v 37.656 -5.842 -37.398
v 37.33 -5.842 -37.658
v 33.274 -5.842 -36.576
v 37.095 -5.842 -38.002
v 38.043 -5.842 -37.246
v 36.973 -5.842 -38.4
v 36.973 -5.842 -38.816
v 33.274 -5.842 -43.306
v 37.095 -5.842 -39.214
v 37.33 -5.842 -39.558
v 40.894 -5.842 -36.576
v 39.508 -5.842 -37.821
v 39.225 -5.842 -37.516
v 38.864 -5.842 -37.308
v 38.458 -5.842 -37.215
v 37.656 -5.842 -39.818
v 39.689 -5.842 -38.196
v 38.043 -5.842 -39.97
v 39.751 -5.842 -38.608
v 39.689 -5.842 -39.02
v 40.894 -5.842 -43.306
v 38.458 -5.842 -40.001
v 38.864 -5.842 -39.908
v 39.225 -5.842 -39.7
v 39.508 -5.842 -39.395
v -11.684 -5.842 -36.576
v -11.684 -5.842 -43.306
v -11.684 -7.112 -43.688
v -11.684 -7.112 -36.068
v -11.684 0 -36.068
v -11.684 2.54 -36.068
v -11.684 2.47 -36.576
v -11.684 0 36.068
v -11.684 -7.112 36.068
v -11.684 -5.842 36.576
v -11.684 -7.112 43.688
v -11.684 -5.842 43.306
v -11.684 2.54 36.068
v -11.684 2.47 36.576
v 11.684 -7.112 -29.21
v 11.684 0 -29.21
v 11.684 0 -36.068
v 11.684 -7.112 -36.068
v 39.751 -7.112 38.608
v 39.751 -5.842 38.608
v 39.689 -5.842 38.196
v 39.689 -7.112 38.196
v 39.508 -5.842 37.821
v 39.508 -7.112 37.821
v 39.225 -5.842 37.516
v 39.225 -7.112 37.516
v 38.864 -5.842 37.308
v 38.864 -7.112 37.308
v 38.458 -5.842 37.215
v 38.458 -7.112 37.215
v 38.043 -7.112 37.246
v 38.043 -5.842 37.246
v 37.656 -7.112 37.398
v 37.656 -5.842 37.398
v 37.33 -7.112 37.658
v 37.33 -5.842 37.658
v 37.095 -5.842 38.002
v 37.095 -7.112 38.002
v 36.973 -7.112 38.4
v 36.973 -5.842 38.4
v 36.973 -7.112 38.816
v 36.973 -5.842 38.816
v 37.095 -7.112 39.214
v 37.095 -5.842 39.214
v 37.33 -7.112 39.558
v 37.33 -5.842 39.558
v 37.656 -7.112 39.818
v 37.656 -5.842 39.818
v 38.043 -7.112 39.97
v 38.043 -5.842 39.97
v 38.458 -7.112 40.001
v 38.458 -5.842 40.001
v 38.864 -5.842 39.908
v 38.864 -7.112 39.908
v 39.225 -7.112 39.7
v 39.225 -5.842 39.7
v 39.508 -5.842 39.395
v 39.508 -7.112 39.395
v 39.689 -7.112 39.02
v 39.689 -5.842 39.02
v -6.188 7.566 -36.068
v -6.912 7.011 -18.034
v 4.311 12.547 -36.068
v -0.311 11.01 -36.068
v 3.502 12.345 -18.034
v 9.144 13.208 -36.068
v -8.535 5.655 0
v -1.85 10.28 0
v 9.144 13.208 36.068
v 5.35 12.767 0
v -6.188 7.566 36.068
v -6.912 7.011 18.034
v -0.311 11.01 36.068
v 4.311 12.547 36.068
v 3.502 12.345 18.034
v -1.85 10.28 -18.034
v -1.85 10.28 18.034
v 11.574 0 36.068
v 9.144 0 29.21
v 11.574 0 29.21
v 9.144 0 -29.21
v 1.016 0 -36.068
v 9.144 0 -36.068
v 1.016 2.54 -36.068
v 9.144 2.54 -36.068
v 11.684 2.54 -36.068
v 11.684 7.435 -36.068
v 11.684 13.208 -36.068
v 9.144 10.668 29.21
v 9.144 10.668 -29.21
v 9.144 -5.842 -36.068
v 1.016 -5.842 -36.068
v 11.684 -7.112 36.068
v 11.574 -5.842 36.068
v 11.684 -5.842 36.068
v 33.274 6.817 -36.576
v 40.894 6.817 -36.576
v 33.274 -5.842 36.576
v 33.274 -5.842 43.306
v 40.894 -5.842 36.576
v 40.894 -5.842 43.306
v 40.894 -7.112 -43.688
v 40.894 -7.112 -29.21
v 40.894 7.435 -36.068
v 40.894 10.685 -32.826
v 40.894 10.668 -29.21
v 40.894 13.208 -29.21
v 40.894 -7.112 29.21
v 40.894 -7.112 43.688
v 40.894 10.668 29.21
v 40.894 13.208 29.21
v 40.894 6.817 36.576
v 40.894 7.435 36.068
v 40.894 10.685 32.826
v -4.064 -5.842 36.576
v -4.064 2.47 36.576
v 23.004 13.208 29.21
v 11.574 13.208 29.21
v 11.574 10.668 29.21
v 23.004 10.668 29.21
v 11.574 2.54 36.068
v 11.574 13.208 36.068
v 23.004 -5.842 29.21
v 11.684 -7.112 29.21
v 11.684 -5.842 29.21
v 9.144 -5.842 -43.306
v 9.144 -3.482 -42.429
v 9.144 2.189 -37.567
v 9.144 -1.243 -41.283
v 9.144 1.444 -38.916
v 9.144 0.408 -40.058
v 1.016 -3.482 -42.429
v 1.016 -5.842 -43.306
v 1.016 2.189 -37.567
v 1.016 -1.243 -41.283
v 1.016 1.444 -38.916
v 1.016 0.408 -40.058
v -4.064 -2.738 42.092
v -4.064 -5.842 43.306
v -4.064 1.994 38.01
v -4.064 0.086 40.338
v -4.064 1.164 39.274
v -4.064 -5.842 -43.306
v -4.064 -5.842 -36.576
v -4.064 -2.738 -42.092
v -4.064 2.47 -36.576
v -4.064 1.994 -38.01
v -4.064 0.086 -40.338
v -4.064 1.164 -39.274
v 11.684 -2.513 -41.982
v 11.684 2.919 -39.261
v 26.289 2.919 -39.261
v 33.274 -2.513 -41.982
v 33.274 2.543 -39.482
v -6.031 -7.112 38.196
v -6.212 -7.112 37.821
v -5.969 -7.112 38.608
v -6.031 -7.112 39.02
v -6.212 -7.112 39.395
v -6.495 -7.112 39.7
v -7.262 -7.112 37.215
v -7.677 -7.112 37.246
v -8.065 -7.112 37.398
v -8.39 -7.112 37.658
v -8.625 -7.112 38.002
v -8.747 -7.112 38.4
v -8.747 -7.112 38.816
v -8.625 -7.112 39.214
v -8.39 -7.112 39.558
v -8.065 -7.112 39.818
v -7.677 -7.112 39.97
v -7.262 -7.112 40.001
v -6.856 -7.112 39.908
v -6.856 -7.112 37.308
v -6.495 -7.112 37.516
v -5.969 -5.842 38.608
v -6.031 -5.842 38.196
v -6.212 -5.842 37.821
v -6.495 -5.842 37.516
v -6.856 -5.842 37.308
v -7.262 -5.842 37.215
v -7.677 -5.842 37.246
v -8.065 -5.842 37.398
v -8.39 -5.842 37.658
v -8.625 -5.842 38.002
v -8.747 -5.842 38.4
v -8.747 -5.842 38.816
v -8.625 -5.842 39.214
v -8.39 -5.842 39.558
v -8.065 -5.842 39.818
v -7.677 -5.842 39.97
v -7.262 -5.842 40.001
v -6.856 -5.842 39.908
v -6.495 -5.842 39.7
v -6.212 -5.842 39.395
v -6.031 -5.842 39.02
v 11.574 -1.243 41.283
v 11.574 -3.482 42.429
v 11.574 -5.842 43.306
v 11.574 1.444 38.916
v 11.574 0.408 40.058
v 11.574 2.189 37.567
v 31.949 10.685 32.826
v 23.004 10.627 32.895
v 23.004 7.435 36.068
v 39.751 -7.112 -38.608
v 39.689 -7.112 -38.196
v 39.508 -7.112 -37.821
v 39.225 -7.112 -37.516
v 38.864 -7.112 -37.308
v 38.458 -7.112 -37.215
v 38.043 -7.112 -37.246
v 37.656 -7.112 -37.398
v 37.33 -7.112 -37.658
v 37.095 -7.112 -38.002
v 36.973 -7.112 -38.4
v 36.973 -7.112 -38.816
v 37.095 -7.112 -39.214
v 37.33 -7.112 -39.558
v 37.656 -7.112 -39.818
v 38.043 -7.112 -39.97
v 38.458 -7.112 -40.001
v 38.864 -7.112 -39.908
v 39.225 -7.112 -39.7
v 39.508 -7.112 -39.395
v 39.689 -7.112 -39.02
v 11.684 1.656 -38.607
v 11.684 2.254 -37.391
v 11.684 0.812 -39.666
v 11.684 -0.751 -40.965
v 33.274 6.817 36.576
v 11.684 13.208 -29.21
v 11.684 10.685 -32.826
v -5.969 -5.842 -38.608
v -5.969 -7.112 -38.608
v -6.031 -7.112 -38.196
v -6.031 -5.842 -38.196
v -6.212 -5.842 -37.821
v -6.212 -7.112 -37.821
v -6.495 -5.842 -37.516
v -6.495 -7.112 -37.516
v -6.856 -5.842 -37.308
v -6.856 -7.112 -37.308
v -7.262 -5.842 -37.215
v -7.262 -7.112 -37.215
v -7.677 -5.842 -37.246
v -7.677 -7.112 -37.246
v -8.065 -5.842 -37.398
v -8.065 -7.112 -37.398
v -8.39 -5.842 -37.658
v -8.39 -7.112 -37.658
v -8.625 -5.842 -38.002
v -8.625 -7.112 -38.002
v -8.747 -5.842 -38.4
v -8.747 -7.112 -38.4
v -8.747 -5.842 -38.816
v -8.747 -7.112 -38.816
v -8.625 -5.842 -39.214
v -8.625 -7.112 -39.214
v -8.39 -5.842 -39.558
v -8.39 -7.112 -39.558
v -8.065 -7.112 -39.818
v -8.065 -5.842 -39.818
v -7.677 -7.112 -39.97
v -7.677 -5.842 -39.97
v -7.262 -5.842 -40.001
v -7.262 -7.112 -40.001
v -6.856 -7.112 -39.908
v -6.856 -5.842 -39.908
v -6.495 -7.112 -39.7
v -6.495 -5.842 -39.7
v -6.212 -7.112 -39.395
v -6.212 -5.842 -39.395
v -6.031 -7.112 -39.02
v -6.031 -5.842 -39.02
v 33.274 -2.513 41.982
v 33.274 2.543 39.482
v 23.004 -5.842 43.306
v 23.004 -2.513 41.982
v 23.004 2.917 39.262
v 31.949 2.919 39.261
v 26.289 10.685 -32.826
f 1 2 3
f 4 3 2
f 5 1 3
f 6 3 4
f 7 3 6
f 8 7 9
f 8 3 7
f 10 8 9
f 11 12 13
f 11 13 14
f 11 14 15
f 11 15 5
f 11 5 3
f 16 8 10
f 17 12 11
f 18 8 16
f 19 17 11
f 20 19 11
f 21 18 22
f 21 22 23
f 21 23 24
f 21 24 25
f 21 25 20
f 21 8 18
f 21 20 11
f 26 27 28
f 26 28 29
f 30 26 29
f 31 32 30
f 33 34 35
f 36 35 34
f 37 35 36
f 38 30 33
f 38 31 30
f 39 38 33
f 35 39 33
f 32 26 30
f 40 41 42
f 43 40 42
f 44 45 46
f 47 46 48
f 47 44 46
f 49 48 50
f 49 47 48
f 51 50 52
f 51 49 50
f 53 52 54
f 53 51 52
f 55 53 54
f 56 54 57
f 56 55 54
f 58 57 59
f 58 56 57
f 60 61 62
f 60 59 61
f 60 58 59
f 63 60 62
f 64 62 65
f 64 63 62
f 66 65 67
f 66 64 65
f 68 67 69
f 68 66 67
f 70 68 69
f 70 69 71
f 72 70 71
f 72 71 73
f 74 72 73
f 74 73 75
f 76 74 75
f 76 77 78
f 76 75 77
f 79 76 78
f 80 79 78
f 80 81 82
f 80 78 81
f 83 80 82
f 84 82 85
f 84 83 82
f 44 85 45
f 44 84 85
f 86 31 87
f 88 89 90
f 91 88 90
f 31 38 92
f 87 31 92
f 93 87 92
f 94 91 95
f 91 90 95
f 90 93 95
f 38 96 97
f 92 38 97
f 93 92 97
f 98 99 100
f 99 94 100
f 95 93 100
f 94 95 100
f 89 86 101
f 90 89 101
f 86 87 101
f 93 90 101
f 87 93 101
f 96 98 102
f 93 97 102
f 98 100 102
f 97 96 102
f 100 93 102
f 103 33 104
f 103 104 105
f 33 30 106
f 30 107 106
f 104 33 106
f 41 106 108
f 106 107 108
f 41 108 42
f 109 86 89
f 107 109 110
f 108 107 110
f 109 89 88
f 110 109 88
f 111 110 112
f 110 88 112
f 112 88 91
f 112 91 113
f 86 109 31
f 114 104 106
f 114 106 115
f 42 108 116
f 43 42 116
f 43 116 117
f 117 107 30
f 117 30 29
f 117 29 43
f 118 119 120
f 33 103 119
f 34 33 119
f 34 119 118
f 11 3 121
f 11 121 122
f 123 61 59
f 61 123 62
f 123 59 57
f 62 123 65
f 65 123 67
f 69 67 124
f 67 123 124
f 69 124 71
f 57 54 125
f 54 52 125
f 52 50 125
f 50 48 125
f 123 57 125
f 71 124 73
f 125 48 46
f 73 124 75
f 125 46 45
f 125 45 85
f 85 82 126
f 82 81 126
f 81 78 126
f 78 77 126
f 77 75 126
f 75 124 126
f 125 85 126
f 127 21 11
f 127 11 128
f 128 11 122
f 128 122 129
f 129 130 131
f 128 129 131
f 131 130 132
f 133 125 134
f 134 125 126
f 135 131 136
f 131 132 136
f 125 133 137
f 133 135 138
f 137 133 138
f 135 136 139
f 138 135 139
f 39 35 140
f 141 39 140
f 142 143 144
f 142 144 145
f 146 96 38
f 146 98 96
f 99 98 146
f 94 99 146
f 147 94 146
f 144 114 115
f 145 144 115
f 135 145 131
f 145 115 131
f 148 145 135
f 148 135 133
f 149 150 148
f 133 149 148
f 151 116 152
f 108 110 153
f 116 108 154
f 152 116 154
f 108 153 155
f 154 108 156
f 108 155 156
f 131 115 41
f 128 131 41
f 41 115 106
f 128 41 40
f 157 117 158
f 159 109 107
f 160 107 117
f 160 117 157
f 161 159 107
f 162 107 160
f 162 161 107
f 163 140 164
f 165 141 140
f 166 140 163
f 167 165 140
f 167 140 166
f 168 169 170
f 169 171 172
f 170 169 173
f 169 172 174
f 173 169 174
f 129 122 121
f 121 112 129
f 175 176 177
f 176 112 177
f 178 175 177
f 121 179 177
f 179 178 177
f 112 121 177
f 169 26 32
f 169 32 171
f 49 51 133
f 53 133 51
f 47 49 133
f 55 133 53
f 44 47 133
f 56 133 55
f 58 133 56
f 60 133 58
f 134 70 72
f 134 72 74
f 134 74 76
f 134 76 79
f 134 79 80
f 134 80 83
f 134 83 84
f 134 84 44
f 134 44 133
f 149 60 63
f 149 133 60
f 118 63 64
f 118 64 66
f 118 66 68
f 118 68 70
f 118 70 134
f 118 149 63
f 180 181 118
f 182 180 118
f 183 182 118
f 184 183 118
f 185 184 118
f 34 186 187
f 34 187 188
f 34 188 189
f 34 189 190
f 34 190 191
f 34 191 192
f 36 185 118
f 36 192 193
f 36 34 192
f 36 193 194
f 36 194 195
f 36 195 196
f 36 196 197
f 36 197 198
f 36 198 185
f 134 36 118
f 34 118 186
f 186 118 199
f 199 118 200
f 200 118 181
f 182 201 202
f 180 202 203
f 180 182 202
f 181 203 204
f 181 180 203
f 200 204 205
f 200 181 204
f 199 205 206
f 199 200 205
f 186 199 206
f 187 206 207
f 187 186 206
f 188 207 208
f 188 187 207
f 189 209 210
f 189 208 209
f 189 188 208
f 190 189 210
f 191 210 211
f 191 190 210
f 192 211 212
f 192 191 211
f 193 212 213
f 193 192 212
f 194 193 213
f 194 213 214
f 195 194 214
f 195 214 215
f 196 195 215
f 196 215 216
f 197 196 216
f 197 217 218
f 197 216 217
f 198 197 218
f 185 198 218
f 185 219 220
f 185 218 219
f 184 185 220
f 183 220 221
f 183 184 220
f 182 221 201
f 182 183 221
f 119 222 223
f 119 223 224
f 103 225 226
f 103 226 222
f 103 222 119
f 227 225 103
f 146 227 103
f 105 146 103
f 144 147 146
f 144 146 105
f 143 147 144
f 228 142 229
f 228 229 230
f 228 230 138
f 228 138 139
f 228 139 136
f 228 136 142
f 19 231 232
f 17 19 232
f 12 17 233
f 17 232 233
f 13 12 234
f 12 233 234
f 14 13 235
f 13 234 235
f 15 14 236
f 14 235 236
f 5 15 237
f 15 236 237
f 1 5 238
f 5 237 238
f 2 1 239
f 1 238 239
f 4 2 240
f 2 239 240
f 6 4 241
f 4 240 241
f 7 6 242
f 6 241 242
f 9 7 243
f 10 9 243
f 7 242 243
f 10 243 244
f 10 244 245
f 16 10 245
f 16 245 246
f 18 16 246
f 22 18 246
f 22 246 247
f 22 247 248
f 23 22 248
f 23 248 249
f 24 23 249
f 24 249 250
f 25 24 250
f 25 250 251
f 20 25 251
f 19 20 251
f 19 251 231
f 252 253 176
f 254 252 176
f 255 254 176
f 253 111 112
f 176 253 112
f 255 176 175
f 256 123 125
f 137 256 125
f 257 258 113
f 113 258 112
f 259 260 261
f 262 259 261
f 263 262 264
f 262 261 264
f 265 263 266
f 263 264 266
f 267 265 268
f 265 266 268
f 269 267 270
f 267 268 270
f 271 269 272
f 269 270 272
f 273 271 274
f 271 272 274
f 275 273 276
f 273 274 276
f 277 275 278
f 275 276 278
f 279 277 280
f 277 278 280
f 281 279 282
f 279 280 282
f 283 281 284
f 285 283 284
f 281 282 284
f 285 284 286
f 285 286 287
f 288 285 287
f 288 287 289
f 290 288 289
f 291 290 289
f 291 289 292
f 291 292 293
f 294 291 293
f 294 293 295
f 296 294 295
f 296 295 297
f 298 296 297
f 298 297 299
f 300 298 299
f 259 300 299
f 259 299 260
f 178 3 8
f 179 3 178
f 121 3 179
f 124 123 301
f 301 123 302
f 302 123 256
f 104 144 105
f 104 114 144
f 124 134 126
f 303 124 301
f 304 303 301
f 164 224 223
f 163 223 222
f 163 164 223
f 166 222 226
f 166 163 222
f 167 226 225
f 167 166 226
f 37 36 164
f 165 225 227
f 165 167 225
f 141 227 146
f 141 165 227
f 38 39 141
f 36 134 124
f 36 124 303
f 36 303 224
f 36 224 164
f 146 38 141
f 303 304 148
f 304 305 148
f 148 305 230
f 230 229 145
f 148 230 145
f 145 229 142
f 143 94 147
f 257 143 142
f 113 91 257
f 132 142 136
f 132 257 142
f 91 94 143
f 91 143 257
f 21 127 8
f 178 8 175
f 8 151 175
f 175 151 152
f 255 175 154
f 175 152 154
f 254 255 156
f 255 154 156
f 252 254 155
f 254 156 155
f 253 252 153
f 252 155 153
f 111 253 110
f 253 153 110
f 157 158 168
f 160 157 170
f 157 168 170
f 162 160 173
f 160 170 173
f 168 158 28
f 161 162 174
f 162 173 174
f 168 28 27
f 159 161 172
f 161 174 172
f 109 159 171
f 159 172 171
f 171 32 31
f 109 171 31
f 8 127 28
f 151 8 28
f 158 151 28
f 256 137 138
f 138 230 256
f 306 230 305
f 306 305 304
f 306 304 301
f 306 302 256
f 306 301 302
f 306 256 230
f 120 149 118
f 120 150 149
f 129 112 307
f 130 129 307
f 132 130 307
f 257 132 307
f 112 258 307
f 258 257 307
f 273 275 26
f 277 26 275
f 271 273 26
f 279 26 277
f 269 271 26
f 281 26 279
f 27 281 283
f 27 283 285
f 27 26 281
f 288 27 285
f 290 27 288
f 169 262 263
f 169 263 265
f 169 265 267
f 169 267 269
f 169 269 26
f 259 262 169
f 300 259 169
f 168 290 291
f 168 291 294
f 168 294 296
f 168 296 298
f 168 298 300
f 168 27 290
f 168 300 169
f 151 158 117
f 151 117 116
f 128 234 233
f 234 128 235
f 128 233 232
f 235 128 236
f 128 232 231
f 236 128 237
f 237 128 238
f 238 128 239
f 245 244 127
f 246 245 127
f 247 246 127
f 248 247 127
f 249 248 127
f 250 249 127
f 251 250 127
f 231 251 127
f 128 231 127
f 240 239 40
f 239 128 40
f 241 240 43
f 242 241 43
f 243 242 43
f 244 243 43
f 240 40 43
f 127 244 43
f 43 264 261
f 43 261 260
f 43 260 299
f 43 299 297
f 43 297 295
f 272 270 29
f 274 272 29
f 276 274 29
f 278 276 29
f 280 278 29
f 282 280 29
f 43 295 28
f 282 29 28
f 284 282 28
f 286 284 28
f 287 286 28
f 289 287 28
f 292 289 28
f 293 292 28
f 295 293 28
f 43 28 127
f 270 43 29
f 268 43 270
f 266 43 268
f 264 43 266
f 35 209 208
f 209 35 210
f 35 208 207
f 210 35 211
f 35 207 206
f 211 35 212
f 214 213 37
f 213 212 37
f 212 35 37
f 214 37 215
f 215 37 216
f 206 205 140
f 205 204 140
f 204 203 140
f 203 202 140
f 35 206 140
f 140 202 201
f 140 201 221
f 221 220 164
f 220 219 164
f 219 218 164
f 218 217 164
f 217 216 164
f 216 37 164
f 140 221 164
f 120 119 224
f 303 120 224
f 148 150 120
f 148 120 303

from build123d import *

# Parameters (mm, degrees)
SKETCH1_W           = 23.368
SKETCH1_H           = 72.136
BOSS_EXTRUDE1_DEPTH = 2.54
SKETCH2_W           = 2.54
SKETCH2_H           = 58.42
CUT_EXTRUDE1_DEPTH  = 2.54
SKETCH3_W           = 2.54
SKETCH3_H           = 6.858
BOSS_EXTRUDE2_DEPTH = 8.128
SKETCH4_W           = 31.75
SKETCH4_H           = 58.42
BOSS_EXTRUDE3_DEPTH = 2.54
SKETCH5_W           = 2.54
SKETCH5_H           = 6.858
BOSS_EXTRUDE4_DEPTH = 2.54
BOSS_EXTRUDE5_START = -11.684
BOSS_EXTRUDE5_DEPTH = 52.578
BOSS_EXTRUDE6_DEPTH = 29.21
SKETCH10_W          = 7.62
SKETCH10_H          = 7.112
CUT_EXTRUDE2_DEPTH  = 31.242
SKETCH12_R          = 1.397
CUT_EXTRUDE3_DEPTH  = 21.3200001
BOSS_EXTRUDE7_DEPTH = 72.136
SKETCH14_W          = 8.128
SKETCH14_H          = 7.62
SKETCH14_W_2        = 11.43
SKETCH14_H_2        = 14.478
CUT_EXTRUDE4_DEPTH  = 31.242


with BuildPart() as part:
    # Sketch1 → Boss-Extrude1 (new body)
    with BuildSketch(Plane(origin=(0, 0, 0), x_dir=(1, 0, 0), z_dir=(0, 1, 0))):
        Rectangle(SKETCH1_W, SKETCH1_H)
    extrude(amount=BOSS_EXTRUDE1_DEPTH)

    # Sketch2 → Cut-Extrude1 (cut)
    with BuildSketch(Plane(origin=(0, 2.54, 0), x_dir=(1, 0, 0), z_dir=(0, 1, 0))):
        with Locations((10.414, 0)):
            Rectangle(SKETCH2_W, SKETCH2_H)
    extrude(amount=-CUT_EXTRUDE1_DEPTH, mode=Mode.SUBTRACT)

    # Sketch3 → Boss-Extrude2 (add)
    with BuildSketch(Plane(origin=(0, 2.54, 0), x_dir=(1, 0, 0), z_dir=(0, 1, 0))):
        with Locations((10.414, -32.639)):
            Rectangle(SKETCH3_W, SKETCH3_H)
        with Locations((10.414, 32.639)):
            Rectangle(SKETCH3_W, SKETCH3_H)
    extrude(amount=BOSS_EXTRUDE2_DEPTH)



with BuildPart() as body_2:
    # Sketch4 → Boss-Extrude3 (new body)
    with BuildSketch(Plane(origin=(0, 10.668, 0), x_dir=(1, 0, 0), z_dir=(0, 1, 0))):
        with Locations((25.019, 0)):
            Rectangle(SKETCH4_W, SKETCH4_H)
    extrude(amount=BOSS_EXTRUDE3_DEPTH)


with BuildPart() as part_1:
    add(part.part)

    add(body_2.part)  # Boss-Extrude4 merges body 2
    # Sketch5 → Boss-Extrude4 (add)
    with BuildSketch(Plane(origin=(0, 10.668, 0), x_dir=(1, 0, 0), z_dir=(0, 1, 0))):
        with Locations((10.414, -32.639)):
            Rectangle(SKETCH5_W, SKETCH5_H)
        with Locations((10.414, 32.639)):
            Rectangle(SKETCH5_W, SKETCH5_H)
    extrude(amount=BOSS_EXTRUDE4_DEPTH)

    # Sketch6 → Boss-Extrude5 (add)
    with BuildSketch(Plane(origin=(0, 0, 0), x_dir=(0, 0, -1), z_dir=(1, 0, 0)).offset(BOSS_EXTRUDE5_START)):
        with BuildLine():
            add(Edge.make_bspline(
                [(43.688, -7.112), (41.104515695, 2.079413445), (36.068, 2.54)],
                knots=[0, 0, 0, 0.627076912, 0.627076912, 0.627076912], degree=2))
            Line((36.068, 2.54), (36.068, -7.112))
            Line((36.068, -7.112), (43.688, -7.112))
        make_face()
    boss_extrude5 = extrude(amount=BOSS_EXTRUDE5_DEPTH)

    # Sketch7 → Boss-Extrude6 (add)
    with BuildSketch(Plane(origin=(11.684, 0, 0), x_dir=(0, 0, -1), z_dir=(1, 0, 0))):
        with BuildLine():
            add(Edge.make_bspline(
                [(36.068, 7.434839088), (33.013673055, 11.048422605), (29.21, 13.208)],
                knots=[0.279115305, 0.279115305, 0.279115305, 0.460674554, 0.460674554, 0.460674554], degree=2))
            Line((29.21, 13.208), (29.21, 10.668))
            Line((29.21, 10.668), (29.21, 0))
            Line((29.21, 0), (36.068, 0))
            Line((36.068, 0), (36.068, 2.54))
            Line((36.068, 2.54), (36.068, 7.434839088))
        make_face()
        with BuildLine():
            add(Edge.make_bspline(
                [(43.688, -7.112), (40.763488669, 1.879592133), (36.068, 7.434839088)],
                knots=[0, 0, 0, 0.279115305, 0.279115305, 0.279115305], degree=2))
            Line((36.068, 7.434839088), (36.068, 2.54))
            Line((36.068, 2.54), (36.068, 0))
            Line((36.068, 0), (29.21, 0))
            Line((29.21, 0), (29.21, -7.112))
            Line((29.21, -7.112), (43.688, -7.112))
        make_face()
    boss_extrude6 = extrude(amount=BOSS_EXTRUDE6_DEPTH)

    # Sketch10 → Cut-Extrude2 (cut)
    with BuildSketch(Plane(origin=(0, 25.4, 0), x_dir=(1, 0, 0), z_dir=(0, 1, 0))):
        with Locations((-7.874, 40.132)):
            Rectangle(SKETCH10_W, SKETCH10_H)
        with Locations((37.084, 40.132)):
            Rectangle(SKETCH10_W, SKETCH10_H)
    cut_extrude2 = extrude(amount=-CUT_EXTRUDE2_DEPTH, mode=Mode.SUBTRACT)

    # Sketch12 → Cut-Extrude3 (cut, through all)
    with BuildSketch(Plane.XZ.offset(7.112)):
        with Locations((-7.366, -38.608)):
            Circle(SKETCH12_R)
        with Locations((38.354, -38.608)):
            Circle(SKETCH12_R)
    cut_extrude3 = extrude(amount=-CUT_EXTRUDE3_DEPTH, mode=Mode.SUBTRACT)

    # Mirror1: Boss-Extrude5, Boss-Extrude6, Cut-Extrude2, Cut-Extrude3 across plane
    add(boss_extrude5.mirror(Plane.XY))
    add(boss_extrude6.mirror(Plane.XY))
    add(cut_extrude2.mirror(Plane.XY), mode=Mode.SUBTRACT)
    add(cut_extrude3.mirror(Plane.XY), mode=Mode.SUBTRACT)

    # Sketch13 → Boss-Extrude7 (add)
    with BuildSketch(Plane.XY.offset(36.068)):
        with BuildLine():
            Line((9.144, 2.54), (9.144, 13.208))
            add(Edge.make_bspline(
                [(-11.684, 2.54), (-2.430581771, 12.68572622), (9.144, 13.208)],
                knots=[0, 0, 0, 0.902085906, 0.902085906, 0.902085906], degree=2))
            Line((-11.684, 2.54), (9.144, 2.54))
        make_face()
    extrude(amount=-BOSS_EXTRUDE7_DEPTH)

    # Sketch14 → Cut-Extrude4 (cut)
    with BuildSketch(Plane(origin=(0, 25.4, 0), x_dir=(1, 0, 0), z_dir=(0, 1, 0))):
        with Locations((5.08, 39.878)):
            Rectangle(SKETCH14_W, SKETCH14_H)
        with Locations((17.289418024, -36.449)):
            Rectangle(SKETCH14_W_2, SKETCH14_H_2)
    extrude(amount=-CUT_EXTRUDE4_DEPTH, mode=Mode.SUBTRACT)


solid = part_1.part
